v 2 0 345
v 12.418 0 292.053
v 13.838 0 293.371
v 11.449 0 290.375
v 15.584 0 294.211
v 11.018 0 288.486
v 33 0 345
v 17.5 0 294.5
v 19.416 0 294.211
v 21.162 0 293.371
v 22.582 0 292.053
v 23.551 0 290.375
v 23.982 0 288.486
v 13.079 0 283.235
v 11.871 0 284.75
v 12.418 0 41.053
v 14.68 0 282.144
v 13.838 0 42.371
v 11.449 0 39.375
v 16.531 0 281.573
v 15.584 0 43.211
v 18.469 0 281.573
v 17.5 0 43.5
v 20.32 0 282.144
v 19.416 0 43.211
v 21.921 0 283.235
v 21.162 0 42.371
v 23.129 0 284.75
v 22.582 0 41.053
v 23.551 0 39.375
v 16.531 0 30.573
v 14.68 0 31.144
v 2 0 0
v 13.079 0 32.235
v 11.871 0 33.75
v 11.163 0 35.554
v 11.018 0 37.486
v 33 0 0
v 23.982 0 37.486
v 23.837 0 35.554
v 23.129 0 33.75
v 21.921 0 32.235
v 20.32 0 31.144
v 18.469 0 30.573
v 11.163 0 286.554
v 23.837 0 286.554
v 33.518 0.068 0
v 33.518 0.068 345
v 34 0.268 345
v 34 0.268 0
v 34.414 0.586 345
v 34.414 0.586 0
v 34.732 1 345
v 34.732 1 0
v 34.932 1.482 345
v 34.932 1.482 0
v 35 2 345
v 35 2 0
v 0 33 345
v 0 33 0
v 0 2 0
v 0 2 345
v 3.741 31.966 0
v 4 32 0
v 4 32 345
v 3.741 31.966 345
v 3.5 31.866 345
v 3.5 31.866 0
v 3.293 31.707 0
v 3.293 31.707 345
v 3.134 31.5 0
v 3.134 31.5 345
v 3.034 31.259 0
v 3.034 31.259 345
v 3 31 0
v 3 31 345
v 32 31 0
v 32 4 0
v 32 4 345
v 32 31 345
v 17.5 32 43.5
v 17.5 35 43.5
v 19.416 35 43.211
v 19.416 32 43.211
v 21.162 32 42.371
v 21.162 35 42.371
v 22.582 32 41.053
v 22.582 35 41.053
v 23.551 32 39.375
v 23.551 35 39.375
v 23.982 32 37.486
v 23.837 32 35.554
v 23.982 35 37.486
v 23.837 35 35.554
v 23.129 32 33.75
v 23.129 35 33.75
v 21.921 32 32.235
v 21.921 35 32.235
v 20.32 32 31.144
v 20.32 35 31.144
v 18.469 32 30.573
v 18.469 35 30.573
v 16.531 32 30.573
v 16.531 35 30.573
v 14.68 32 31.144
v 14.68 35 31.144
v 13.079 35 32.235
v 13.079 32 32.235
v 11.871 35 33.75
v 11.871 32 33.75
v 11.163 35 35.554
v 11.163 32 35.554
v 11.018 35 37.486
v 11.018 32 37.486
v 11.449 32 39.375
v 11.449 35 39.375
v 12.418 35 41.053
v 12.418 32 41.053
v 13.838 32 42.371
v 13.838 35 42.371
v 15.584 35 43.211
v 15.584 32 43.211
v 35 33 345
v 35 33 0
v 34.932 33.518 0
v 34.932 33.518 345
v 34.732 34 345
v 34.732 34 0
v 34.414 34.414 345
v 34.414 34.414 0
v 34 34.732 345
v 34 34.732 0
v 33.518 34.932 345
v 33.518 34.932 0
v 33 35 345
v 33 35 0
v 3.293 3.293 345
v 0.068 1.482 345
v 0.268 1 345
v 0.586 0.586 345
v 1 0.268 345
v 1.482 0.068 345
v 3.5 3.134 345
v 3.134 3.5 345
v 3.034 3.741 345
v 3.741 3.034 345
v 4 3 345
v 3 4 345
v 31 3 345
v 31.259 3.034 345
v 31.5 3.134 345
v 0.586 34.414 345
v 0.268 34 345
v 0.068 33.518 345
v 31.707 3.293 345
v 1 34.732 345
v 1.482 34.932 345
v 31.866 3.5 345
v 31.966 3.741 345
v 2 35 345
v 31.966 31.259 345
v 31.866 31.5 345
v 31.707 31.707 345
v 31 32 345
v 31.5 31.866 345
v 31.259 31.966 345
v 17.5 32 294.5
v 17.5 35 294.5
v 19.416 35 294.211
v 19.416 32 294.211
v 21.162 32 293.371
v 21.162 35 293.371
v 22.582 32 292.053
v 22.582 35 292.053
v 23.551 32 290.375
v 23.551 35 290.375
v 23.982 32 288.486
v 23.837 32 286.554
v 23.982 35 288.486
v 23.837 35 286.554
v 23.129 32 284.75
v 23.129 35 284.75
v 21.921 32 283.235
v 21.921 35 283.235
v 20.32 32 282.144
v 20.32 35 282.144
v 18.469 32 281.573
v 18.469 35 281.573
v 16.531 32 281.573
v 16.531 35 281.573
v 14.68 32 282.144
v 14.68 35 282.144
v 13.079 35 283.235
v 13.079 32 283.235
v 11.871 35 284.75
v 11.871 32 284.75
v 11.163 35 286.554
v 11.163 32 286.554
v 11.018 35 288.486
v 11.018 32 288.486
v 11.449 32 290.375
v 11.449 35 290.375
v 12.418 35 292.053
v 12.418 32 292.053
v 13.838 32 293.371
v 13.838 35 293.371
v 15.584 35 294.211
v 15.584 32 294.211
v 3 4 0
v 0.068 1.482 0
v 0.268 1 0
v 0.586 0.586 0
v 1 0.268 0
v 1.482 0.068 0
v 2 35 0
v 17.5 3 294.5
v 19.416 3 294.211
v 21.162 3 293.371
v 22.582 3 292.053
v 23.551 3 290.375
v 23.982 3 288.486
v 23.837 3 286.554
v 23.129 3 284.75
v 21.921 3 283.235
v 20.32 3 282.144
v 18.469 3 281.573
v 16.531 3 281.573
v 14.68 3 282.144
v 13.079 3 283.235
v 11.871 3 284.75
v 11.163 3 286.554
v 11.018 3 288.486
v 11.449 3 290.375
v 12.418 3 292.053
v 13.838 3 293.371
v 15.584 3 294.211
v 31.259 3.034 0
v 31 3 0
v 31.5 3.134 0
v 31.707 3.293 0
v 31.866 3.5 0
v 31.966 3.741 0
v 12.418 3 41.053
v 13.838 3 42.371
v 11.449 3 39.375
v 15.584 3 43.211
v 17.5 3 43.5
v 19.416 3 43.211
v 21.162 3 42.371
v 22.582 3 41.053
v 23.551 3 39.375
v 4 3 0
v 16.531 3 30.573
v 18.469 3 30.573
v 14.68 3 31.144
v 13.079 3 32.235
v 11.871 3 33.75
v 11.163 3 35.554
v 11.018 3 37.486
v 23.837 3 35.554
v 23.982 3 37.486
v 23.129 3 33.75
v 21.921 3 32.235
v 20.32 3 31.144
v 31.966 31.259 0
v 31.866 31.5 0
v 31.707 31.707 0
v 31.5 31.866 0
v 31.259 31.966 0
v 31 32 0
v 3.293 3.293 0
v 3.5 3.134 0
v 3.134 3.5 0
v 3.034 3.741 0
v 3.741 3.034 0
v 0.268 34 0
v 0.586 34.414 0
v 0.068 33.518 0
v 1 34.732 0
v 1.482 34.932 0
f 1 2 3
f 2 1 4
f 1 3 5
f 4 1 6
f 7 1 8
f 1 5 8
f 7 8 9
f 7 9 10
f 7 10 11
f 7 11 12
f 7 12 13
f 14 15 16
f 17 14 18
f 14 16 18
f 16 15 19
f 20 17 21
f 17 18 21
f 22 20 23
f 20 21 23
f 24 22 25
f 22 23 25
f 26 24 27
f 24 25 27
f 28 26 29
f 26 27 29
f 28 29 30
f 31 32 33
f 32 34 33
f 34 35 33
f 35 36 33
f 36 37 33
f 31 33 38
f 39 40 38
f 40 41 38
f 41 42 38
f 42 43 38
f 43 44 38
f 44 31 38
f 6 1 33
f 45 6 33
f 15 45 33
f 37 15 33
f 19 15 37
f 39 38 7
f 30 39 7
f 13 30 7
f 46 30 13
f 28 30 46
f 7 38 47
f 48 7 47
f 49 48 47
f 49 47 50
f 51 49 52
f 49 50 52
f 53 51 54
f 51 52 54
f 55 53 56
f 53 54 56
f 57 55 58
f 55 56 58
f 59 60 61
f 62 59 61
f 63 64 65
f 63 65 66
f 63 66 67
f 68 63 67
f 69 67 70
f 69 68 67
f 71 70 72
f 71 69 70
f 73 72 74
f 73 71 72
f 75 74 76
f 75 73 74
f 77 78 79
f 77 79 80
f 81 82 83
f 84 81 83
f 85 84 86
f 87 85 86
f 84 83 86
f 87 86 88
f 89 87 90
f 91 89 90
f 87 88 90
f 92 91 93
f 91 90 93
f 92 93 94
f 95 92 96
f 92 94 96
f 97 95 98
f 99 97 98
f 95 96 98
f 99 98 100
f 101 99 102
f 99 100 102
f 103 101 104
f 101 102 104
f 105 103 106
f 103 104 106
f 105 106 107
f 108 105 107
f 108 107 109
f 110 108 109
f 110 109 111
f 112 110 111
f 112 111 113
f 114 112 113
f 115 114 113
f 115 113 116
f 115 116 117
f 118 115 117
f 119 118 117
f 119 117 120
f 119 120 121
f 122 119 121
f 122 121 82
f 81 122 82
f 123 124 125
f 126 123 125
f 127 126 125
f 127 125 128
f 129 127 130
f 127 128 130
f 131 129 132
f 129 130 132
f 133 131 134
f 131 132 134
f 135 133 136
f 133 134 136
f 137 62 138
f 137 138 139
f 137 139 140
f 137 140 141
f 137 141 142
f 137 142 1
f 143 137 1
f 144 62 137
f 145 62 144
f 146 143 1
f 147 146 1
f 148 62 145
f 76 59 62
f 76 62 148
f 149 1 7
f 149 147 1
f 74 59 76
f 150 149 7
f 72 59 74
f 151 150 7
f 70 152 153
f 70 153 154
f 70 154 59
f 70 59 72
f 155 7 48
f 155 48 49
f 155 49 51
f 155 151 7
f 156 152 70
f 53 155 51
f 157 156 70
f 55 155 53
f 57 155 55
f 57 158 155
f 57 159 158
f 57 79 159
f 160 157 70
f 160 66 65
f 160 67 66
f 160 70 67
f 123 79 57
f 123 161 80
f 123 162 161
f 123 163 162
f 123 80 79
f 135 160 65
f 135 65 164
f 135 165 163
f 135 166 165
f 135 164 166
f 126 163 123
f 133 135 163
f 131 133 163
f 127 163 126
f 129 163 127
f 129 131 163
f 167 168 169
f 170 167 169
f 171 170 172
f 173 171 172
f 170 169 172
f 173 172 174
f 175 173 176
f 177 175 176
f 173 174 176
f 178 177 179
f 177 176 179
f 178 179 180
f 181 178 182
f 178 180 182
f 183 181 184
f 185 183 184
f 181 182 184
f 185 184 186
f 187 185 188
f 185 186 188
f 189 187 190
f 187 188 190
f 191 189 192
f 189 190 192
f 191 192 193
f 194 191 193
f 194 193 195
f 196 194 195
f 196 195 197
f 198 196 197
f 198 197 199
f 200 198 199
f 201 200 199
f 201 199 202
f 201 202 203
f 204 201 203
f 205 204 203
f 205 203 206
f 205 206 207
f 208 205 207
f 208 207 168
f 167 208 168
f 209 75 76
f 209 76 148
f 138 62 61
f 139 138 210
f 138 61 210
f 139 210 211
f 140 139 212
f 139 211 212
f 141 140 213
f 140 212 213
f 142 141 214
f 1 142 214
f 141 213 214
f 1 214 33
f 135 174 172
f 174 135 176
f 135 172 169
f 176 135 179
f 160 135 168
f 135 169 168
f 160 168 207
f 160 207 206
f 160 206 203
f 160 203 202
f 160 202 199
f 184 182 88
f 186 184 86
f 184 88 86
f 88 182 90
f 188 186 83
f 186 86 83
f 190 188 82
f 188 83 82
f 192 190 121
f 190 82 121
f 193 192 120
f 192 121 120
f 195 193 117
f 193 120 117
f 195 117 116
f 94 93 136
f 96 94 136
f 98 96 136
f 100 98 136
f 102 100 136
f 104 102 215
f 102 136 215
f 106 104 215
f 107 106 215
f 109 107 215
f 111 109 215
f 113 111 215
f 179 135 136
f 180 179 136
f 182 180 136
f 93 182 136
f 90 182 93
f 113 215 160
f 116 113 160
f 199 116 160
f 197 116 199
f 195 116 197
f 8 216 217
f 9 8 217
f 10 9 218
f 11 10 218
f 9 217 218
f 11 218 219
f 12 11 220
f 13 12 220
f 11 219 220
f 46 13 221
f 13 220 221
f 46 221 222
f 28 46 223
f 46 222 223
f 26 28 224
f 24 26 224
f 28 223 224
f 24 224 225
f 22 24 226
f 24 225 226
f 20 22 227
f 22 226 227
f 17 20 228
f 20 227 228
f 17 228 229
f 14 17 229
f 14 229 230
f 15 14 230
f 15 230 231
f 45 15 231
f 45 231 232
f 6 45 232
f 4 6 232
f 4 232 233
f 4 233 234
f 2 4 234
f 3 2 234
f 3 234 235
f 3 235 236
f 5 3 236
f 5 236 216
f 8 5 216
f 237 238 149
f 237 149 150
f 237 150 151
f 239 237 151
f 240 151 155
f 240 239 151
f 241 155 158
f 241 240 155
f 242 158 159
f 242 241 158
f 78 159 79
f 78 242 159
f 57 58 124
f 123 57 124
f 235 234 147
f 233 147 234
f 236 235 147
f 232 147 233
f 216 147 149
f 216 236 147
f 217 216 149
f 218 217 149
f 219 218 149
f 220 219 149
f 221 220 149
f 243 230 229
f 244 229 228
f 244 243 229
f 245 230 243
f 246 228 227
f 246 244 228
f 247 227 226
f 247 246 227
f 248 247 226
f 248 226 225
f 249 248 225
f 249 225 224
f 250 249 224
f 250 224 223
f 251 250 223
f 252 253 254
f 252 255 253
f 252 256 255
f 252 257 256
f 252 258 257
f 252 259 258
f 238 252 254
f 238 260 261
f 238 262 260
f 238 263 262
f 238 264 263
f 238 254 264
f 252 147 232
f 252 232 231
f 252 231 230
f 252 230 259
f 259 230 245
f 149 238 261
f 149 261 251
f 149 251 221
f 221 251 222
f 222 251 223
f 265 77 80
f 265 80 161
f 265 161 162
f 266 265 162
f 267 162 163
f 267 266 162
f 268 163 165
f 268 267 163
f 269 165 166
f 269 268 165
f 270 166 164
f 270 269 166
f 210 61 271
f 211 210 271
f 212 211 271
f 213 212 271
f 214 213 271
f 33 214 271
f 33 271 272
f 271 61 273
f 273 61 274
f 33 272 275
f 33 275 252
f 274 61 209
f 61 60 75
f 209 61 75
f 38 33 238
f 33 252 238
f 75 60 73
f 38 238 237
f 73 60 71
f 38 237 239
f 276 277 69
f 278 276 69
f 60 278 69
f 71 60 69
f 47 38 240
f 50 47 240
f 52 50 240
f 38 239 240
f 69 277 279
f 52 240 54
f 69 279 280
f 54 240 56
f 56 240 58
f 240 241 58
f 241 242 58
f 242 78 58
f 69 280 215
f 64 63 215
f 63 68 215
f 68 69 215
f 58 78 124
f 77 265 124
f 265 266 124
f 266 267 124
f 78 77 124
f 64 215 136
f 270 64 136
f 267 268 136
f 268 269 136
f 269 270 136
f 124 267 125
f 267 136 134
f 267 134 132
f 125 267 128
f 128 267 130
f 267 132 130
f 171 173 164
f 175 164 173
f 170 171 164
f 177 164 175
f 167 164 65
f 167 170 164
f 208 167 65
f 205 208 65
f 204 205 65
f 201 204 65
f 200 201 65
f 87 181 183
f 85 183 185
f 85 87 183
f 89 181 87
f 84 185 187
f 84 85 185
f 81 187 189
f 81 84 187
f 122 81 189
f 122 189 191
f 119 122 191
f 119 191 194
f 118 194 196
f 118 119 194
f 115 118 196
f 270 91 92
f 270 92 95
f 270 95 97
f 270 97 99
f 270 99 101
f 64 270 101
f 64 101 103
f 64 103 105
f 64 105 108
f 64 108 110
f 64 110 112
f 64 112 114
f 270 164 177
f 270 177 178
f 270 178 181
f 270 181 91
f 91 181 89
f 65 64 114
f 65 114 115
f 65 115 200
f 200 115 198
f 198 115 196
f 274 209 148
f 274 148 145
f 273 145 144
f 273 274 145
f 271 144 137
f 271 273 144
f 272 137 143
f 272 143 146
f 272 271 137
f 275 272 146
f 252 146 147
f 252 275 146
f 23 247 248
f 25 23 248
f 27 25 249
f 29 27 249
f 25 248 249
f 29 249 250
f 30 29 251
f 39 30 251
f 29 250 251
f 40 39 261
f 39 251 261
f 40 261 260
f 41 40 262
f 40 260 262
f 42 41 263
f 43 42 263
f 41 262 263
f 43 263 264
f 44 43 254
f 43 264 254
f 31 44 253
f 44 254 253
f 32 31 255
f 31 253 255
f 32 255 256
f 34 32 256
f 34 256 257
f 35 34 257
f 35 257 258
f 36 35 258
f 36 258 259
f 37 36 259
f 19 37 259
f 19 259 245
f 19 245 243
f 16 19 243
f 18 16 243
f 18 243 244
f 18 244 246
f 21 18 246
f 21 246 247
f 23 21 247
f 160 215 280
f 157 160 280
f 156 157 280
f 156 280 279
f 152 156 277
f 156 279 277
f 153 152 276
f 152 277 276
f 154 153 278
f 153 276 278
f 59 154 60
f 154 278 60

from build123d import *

# Parameters (mm, degrees)
DODANIE_WYCI_GNI_CIE1_DEPTH = 345
SZKIC2_R                    = 6.5
WYTNIJ_WYCI_GNI_CIE1_DEPTH  = 345


with BuildPart() as part:
    # Szkic1 → Dodanie-wyciągnięcie1 (new body)
    with BuildSketch(Plane.XY):
        with BuildLine():
            Line((2, 0), (33, 0))
            ThreePointArc((33, 0), (34.414213562, 0.585786438), (35, 2))
            Line((35, 2), (35, 33))
            ThreePointArc((35, 33), (34.414213562, 34.414213562), (33, 35))
            Line((33, 35), (2, 35))
            ThreePointArc((2, 35), (0.585786438, 34.414213562), (0, 33))
            Line((0, 33), (0, 2))
            ThreePointArc((0, 2), (0.585786438, 0.585786438), (2, 0))
        make_face()
        with BuildLine():
            Line((4, 3), (31, 3))
            ThreePointArc((31, 3), (31.707106781, 3.292893219), (32, 4))
            Line((32, 4), (32, 31))
            ThreePointArc((32, 31), (31.707106781, 31.707106781), (31, 32))
            Line((31, 32), (4, 32))
            ThreePointArc((4, 32), (3.292893219, 31.707106781), (3, 31))
            Line((3, 31), (3, 4))
            ThreePointArc((3, 4), (3.292893219, 3.292893219), (4, 3))
        make_face(mode=Mode.SUBTRACT)
    extrude(amount=DODANIE_WYCI_GNI_CIE1_DEPTH)

    # Szkic2 → Wytnij-wyciągnięcie1 (cut)
    with BuildSketch(Plane(origin=(0, 35, 0), x_dir=(1, 0, 0), z_dir=(0, 1, 0))):
        with Locations(Location((17.5, -288, 0), (0, 0, 270))):
            Circle(SZKIC2_R)
        with Locations(Location((17.5, -37, 0), (0, 0, 270))):
            Circle(SZKIC2_R)
    extrude(amount=-WYTNIJ_WYCI_GNI_CIE1_DEPTH, mode=Mode.SUBTRACT)


solid = part.part
